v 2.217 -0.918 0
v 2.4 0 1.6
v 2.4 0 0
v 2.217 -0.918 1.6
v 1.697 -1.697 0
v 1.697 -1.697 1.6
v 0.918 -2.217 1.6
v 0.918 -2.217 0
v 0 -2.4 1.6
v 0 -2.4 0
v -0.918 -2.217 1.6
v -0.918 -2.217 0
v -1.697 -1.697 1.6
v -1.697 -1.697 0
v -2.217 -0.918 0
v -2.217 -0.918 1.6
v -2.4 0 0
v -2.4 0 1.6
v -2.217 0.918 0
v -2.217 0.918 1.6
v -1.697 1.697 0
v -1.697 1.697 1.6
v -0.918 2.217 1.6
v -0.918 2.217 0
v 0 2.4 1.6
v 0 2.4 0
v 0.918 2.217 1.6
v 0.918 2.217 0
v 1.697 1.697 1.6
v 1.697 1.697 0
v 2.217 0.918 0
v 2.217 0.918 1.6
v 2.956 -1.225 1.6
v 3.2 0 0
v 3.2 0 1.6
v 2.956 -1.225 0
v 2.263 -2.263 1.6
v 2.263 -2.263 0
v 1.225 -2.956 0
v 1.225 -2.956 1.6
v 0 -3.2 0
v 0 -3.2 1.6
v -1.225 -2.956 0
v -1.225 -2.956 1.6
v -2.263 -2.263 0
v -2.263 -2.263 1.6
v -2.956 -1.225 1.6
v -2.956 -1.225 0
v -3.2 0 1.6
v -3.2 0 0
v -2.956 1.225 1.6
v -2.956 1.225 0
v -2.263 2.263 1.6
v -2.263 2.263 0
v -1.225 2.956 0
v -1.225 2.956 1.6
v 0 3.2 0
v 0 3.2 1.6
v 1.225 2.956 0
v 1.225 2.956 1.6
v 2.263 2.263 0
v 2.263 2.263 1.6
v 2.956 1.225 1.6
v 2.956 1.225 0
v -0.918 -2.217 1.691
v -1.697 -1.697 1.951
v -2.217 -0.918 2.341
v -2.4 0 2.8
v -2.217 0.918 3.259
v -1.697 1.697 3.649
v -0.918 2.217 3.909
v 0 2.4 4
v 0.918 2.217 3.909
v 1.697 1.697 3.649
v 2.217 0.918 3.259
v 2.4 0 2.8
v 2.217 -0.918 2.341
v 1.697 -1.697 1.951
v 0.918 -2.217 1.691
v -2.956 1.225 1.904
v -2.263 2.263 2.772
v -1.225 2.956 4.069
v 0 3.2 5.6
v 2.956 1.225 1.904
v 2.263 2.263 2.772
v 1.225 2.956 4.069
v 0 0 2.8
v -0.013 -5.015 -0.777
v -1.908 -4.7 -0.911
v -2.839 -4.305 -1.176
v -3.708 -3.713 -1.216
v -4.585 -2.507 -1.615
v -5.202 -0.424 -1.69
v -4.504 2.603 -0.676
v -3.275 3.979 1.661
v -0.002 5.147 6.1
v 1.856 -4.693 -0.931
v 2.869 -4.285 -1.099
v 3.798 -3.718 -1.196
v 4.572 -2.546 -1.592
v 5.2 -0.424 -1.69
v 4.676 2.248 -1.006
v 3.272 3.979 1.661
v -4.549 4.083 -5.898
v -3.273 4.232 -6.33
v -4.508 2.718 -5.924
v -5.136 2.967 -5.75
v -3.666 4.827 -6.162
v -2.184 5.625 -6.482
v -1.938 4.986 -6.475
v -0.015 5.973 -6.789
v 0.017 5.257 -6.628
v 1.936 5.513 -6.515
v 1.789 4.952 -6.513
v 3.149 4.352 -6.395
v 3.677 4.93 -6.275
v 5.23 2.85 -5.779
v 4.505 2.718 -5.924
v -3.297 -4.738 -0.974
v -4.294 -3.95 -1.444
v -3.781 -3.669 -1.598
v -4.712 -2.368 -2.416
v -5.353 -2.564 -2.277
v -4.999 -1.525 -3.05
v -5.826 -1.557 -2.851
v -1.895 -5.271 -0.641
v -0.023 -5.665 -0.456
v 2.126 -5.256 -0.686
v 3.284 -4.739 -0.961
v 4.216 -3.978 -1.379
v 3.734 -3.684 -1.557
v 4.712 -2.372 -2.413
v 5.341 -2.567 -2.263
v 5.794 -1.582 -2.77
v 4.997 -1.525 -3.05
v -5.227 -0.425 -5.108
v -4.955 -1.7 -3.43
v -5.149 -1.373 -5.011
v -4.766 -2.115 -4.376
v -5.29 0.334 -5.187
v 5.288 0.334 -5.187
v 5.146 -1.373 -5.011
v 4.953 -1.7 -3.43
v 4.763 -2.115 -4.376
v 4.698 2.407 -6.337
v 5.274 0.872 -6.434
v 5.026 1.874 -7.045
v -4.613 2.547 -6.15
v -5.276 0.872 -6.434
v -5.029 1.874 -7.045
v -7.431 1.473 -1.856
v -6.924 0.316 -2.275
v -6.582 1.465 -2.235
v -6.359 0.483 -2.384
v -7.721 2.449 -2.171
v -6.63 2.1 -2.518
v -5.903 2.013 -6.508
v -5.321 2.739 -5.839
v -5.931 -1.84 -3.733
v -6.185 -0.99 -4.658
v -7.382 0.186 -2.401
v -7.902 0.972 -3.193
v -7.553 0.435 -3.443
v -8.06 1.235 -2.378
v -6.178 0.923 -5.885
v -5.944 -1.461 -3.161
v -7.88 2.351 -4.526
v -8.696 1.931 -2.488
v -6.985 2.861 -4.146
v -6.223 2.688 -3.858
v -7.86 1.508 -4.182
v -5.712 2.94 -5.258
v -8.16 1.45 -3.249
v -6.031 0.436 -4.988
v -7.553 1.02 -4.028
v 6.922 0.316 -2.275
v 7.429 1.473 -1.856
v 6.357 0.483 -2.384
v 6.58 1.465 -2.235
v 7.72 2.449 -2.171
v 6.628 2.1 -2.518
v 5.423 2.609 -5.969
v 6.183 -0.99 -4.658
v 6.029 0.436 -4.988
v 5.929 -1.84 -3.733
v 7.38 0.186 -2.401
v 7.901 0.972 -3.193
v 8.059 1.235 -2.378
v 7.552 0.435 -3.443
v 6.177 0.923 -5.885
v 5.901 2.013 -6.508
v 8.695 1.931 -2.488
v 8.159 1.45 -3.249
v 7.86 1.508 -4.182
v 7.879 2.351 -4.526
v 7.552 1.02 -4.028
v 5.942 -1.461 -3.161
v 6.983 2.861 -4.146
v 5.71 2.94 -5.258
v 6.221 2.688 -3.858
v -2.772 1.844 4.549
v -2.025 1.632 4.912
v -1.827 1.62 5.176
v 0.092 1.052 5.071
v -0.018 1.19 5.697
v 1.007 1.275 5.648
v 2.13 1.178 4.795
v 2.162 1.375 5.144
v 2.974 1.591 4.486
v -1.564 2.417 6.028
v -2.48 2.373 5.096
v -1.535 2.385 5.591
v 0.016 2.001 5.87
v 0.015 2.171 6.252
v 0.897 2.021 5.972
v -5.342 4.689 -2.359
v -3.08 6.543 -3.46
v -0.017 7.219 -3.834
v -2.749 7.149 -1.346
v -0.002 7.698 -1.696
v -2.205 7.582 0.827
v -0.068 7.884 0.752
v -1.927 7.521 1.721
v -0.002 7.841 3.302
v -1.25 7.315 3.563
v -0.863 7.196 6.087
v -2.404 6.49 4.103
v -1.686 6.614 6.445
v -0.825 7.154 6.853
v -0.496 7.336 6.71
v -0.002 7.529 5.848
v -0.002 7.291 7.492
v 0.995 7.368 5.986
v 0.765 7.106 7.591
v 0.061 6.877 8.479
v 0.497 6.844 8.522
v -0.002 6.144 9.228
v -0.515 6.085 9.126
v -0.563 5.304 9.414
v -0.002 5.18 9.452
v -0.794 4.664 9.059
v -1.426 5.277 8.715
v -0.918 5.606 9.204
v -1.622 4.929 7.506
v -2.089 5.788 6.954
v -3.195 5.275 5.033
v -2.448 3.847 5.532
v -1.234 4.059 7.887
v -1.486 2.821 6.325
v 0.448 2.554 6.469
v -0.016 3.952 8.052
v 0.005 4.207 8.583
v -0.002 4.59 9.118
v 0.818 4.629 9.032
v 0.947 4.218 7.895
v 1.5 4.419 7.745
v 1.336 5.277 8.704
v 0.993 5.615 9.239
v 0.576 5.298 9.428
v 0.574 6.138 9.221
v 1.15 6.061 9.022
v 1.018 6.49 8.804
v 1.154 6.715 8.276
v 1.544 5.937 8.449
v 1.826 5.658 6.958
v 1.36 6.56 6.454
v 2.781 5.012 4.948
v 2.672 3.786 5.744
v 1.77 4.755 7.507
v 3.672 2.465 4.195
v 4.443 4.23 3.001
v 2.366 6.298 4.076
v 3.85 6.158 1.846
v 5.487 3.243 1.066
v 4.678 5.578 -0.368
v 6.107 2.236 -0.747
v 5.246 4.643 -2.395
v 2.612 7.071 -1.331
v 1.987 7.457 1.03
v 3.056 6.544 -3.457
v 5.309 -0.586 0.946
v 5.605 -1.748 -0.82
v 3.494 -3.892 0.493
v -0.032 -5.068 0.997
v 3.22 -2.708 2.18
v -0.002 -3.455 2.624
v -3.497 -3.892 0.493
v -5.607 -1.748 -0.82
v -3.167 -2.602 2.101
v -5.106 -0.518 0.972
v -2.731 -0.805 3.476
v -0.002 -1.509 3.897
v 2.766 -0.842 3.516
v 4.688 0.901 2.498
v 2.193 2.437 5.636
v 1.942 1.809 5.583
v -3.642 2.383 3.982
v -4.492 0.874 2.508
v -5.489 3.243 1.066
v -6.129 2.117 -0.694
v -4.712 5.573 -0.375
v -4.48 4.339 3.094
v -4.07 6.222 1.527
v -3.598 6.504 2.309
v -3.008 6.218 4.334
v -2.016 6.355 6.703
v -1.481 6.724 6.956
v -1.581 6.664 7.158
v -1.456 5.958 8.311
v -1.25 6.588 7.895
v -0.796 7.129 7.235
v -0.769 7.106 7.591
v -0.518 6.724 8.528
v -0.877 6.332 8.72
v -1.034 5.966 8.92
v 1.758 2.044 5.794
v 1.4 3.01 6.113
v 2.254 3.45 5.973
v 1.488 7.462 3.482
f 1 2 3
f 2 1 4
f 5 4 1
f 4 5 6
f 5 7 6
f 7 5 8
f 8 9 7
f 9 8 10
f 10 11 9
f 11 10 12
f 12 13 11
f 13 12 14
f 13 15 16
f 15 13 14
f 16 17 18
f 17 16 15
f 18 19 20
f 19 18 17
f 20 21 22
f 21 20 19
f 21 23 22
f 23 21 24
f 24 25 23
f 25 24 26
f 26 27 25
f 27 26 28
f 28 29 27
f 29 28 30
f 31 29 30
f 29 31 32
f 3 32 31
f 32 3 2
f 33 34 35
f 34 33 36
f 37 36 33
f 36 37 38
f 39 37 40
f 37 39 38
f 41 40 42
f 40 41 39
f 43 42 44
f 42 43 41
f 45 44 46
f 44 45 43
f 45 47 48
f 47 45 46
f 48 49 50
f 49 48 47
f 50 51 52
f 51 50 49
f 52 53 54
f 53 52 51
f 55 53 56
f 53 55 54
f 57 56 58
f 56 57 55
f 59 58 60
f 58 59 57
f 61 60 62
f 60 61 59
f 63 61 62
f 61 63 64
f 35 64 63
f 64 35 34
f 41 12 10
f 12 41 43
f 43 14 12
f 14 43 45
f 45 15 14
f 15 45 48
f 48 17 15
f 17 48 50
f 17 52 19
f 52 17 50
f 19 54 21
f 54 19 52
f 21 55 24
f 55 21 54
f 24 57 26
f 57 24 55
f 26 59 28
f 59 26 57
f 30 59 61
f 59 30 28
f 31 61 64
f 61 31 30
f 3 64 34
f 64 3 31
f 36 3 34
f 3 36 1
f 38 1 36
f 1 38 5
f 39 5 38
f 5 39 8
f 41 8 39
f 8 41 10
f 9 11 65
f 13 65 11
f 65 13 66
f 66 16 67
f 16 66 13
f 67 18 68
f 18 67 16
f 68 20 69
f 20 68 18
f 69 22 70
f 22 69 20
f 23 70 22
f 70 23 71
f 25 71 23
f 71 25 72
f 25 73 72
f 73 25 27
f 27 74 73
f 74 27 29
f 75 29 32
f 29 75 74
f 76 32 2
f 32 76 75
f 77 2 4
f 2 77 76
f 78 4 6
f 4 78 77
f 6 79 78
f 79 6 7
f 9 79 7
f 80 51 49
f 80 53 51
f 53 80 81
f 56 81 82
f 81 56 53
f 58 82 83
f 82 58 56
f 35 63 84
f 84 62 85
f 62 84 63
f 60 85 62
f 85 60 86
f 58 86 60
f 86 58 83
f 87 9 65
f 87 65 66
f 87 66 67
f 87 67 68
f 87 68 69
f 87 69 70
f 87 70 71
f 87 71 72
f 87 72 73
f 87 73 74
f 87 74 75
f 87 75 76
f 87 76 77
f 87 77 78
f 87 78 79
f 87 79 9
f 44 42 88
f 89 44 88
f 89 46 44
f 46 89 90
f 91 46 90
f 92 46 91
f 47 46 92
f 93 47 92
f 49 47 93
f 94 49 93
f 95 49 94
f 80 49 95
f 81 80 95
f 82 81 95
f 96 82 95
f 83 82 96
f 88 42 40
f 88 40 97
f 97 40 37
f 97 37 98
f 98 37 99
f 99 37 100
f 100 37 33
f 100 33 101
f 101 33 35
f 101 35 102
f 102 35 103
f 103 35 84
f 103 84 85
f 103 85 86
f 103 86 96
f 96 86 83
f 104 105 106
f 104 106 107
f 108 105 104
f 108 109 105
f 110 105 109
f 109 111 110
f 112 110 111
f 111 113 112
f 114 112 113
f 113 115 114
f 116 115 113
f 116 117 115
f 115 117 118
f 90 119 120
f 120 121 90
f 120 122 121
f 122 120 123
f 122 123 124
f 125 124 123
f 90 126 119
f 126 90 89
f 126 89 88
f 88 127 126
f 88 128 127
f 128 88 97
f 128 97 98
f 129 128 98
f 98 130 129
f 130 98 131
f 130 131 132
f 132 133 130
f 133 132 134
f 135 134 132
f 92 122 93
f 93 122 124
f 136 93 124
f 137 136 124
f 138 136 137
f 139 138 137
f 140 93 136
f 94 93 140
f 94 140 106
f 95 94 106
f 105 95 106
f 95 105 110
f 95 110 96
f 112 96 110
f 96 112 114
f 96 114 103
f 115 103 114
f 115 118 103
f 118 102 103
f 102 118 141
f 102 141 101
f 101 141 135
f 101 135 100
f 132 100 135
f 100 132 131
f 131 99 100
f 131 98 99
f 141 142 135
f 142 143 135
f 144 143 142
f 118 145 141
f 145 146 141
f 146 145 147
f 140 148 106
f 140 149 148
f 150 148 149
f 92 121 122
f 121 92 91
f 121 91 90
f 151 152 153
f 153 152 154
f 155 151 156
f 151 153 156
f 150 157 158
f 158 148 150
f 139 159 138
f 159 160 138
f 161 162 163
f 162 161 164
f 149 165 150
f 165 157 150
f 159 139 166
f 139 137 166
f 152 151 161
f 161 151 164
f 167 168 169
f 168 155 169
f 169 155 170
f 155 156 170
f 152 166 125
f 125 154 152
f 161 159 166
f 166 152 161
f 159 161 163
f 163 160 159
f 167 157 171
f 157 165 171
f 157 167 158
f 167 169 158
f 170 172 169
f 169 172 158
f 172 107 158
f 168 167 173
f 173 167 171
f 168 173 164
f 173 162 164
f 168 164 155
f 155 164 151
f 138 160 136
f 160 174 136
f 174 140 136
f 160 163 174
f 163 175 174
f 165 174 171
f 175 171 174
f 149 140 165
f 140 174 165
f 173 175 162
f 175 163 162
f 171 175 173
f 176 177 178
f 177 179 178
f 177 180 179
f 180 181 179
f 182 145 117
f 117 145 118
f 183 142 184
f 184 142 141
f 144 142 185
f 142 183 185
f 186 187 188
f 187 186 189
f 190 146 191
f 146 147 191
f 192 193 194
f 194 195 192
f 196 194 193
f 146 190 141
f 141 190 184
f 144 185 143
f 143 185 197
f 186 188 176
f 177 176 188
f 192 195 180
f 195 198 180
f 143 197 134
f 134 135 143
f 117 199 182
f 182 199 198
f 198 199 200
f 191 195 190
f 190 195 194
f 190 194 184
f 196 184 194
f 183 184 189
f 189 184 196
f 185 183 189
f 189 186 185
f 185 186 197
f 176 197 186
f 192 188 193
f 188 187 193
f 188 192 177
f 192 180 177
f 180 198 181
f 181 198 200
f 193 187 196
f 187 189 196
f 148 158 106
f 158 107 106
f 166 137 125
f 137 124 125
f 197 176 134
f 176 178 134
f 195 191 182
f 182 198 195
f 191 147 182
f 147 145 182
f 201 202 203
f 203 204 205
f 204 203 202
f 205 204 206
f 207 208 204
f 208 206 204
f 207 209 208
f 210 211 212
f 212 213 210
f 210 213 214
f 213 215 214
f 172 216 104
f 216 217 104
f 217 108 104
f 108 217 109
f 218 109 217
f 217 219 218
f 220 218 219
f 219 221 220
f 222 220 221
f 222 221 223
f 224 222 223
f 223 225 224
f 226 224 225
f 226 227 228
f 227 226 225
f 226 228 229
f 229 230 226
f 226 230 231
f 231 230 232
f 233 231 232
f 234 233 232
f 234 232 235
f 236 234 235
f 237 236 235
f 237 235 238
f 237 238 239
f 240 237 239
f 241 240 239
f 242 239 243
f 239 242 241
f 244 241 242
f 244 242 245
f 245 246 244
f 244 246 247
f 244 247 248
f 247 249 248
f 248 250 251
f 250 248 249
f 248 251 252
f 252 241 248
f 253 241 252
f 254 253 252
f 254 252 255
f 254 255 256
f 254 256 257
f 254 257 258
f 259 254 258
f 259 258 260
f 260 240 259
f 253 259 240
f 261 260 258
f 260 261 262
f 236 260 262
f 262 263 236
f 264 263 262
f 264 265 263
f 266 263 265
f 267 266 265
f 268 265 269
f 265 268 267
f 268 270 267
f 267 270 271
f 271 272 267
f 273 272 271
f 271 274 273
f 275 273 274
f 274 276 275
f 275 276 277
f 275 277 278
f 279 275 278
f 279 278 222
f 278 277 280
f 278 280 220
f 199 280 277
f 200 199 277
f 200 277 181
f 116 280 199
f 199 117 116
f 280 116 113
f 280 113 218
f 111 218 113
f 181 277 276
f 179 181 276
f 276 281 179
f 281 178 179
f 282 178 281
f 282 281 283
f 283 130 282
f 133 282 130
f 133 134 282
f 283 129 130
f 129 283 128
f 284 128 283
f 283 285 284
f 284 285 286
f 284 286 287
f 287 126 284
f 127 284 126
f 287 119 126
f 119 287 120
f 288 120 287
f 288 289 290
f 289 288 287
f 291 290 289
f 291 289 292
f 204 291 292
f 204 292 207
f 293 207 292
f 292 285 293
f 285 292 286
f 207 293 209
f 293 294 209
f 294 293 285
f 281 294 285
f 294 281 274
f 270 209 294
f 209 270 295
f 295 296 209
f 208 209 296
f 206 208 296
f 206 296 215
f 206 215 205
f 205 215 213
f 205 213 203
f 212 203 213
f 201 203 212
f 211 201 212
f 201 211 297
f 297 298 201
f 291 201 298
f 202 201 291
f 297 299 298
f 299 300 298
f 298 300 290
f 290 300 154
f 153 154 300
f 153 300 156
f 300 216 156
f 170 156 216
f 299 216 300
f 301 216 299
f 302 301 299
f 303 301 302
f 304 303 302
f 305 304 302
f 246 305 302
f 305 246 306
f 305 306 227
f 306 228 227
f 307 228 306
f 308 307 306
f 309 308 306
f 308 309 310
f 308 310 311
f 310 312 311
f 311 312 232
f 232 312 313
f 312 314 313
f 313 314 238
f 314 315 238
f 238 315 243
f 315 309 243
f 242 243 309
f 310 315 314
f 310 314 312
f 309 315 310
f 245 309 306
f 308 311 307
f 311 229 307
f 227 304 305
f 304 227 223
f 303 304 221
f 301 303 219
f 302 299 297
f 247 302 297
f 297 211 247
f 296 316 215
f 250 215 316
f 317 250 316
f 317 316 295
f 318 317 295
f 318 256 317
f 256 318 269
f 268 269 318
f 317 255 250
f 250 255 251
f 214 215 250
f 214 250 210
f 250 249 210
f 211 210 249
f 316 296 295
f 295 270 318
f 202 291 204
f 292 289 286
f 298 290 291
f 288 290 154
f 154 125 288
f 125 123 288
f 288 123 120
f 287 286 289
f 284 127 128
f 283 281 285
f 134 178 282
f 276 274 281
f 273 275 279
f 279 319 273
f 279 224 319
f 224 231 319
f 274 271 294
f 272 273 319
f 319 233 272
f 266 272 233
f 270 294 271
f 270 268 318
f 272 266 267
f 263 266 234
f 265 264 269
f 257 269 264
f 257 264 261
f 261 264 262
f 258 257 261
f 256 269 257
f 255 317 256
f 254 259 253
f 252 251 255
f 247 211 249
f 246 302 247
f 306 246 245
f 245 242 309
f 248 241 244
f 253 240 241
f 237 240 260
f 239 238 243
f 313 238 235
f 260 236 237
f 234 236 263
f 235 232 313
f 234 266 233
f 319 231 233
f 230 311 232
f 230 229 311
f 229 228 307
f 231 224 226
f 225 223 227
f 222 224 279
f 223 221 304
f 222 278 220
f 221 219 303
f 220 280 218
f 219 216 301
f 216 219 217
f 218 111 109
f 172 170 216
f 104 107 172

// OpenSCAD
use <../lib.scad>
use <s/13787s01.scad>
use <s/13787s02.scad>
function ldraw_lib__13787() = [
// 0 Minifig Hat Elf with Pointy Ears
// 0 Name: 13787.dat
// 0 Author: Philippe Hurbain [Philo]
// 0 !LDRAW_ORG Part UPDATE 2014-02
// 0 !LICENSE Licensed under CC BY 2.0 and CC BY 4.0 : see CAreadme.txt
// 
// 0 BFC CERTIFY CCW
  [0,"BFC","CERTIFY"],
  [0,"BFC","CCW"],
// 
// 0 !CATEGORY Minifig Headwear
// 
// 0 !HISTORY 2014-09-26 {LEGO Digital Designer} Original part shape
// 0 !HISTORY 2014-09-26 [Philo] File preparation for LDraw Parts Tracker
// 0 !HISTORY 2014-12-23 [PTadmin] Official Update 2014-02
// 
// 
// 1 16 0 0 0 1 0 0 0 1 0 0 0 1 s\13787s01.dat
  [1,16,0,0,0,1,0,0,0,1,0,0,0,1, ldraw_lib__s__13787s01()],
// 1 16 0 0 0 1 0 0 0 1 0 0 0 1 s\13787s02.dat
  [1,16,0,0,0,1,0,0,0,1,0,0,0,1, ldraw_lib__s__13787s02()],
];
makepoly(ldraw_lib__13787(), line=0.2);
